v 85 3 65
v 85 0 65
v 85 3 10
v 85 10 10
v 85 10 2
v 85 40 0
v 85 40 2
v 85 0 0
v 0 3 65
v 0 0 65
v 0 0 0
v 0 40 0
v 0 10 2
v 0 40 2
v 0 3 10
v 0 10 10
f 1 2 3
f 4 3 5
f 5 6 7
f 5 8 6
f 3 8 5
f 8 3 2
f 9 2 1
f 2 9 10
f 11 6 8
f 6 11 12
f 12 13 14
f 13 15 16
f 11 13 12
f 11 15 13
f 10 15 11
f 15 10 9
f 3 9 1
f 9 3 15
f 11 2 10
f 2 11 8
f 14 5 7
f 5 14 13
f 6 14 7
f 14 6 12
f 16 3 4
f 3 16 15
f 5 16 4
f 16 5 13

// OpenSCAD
$fn = 10;

cube([85, 3, 65]);
cube([85, 40, 2]);
cube([85, 10, 10]);
